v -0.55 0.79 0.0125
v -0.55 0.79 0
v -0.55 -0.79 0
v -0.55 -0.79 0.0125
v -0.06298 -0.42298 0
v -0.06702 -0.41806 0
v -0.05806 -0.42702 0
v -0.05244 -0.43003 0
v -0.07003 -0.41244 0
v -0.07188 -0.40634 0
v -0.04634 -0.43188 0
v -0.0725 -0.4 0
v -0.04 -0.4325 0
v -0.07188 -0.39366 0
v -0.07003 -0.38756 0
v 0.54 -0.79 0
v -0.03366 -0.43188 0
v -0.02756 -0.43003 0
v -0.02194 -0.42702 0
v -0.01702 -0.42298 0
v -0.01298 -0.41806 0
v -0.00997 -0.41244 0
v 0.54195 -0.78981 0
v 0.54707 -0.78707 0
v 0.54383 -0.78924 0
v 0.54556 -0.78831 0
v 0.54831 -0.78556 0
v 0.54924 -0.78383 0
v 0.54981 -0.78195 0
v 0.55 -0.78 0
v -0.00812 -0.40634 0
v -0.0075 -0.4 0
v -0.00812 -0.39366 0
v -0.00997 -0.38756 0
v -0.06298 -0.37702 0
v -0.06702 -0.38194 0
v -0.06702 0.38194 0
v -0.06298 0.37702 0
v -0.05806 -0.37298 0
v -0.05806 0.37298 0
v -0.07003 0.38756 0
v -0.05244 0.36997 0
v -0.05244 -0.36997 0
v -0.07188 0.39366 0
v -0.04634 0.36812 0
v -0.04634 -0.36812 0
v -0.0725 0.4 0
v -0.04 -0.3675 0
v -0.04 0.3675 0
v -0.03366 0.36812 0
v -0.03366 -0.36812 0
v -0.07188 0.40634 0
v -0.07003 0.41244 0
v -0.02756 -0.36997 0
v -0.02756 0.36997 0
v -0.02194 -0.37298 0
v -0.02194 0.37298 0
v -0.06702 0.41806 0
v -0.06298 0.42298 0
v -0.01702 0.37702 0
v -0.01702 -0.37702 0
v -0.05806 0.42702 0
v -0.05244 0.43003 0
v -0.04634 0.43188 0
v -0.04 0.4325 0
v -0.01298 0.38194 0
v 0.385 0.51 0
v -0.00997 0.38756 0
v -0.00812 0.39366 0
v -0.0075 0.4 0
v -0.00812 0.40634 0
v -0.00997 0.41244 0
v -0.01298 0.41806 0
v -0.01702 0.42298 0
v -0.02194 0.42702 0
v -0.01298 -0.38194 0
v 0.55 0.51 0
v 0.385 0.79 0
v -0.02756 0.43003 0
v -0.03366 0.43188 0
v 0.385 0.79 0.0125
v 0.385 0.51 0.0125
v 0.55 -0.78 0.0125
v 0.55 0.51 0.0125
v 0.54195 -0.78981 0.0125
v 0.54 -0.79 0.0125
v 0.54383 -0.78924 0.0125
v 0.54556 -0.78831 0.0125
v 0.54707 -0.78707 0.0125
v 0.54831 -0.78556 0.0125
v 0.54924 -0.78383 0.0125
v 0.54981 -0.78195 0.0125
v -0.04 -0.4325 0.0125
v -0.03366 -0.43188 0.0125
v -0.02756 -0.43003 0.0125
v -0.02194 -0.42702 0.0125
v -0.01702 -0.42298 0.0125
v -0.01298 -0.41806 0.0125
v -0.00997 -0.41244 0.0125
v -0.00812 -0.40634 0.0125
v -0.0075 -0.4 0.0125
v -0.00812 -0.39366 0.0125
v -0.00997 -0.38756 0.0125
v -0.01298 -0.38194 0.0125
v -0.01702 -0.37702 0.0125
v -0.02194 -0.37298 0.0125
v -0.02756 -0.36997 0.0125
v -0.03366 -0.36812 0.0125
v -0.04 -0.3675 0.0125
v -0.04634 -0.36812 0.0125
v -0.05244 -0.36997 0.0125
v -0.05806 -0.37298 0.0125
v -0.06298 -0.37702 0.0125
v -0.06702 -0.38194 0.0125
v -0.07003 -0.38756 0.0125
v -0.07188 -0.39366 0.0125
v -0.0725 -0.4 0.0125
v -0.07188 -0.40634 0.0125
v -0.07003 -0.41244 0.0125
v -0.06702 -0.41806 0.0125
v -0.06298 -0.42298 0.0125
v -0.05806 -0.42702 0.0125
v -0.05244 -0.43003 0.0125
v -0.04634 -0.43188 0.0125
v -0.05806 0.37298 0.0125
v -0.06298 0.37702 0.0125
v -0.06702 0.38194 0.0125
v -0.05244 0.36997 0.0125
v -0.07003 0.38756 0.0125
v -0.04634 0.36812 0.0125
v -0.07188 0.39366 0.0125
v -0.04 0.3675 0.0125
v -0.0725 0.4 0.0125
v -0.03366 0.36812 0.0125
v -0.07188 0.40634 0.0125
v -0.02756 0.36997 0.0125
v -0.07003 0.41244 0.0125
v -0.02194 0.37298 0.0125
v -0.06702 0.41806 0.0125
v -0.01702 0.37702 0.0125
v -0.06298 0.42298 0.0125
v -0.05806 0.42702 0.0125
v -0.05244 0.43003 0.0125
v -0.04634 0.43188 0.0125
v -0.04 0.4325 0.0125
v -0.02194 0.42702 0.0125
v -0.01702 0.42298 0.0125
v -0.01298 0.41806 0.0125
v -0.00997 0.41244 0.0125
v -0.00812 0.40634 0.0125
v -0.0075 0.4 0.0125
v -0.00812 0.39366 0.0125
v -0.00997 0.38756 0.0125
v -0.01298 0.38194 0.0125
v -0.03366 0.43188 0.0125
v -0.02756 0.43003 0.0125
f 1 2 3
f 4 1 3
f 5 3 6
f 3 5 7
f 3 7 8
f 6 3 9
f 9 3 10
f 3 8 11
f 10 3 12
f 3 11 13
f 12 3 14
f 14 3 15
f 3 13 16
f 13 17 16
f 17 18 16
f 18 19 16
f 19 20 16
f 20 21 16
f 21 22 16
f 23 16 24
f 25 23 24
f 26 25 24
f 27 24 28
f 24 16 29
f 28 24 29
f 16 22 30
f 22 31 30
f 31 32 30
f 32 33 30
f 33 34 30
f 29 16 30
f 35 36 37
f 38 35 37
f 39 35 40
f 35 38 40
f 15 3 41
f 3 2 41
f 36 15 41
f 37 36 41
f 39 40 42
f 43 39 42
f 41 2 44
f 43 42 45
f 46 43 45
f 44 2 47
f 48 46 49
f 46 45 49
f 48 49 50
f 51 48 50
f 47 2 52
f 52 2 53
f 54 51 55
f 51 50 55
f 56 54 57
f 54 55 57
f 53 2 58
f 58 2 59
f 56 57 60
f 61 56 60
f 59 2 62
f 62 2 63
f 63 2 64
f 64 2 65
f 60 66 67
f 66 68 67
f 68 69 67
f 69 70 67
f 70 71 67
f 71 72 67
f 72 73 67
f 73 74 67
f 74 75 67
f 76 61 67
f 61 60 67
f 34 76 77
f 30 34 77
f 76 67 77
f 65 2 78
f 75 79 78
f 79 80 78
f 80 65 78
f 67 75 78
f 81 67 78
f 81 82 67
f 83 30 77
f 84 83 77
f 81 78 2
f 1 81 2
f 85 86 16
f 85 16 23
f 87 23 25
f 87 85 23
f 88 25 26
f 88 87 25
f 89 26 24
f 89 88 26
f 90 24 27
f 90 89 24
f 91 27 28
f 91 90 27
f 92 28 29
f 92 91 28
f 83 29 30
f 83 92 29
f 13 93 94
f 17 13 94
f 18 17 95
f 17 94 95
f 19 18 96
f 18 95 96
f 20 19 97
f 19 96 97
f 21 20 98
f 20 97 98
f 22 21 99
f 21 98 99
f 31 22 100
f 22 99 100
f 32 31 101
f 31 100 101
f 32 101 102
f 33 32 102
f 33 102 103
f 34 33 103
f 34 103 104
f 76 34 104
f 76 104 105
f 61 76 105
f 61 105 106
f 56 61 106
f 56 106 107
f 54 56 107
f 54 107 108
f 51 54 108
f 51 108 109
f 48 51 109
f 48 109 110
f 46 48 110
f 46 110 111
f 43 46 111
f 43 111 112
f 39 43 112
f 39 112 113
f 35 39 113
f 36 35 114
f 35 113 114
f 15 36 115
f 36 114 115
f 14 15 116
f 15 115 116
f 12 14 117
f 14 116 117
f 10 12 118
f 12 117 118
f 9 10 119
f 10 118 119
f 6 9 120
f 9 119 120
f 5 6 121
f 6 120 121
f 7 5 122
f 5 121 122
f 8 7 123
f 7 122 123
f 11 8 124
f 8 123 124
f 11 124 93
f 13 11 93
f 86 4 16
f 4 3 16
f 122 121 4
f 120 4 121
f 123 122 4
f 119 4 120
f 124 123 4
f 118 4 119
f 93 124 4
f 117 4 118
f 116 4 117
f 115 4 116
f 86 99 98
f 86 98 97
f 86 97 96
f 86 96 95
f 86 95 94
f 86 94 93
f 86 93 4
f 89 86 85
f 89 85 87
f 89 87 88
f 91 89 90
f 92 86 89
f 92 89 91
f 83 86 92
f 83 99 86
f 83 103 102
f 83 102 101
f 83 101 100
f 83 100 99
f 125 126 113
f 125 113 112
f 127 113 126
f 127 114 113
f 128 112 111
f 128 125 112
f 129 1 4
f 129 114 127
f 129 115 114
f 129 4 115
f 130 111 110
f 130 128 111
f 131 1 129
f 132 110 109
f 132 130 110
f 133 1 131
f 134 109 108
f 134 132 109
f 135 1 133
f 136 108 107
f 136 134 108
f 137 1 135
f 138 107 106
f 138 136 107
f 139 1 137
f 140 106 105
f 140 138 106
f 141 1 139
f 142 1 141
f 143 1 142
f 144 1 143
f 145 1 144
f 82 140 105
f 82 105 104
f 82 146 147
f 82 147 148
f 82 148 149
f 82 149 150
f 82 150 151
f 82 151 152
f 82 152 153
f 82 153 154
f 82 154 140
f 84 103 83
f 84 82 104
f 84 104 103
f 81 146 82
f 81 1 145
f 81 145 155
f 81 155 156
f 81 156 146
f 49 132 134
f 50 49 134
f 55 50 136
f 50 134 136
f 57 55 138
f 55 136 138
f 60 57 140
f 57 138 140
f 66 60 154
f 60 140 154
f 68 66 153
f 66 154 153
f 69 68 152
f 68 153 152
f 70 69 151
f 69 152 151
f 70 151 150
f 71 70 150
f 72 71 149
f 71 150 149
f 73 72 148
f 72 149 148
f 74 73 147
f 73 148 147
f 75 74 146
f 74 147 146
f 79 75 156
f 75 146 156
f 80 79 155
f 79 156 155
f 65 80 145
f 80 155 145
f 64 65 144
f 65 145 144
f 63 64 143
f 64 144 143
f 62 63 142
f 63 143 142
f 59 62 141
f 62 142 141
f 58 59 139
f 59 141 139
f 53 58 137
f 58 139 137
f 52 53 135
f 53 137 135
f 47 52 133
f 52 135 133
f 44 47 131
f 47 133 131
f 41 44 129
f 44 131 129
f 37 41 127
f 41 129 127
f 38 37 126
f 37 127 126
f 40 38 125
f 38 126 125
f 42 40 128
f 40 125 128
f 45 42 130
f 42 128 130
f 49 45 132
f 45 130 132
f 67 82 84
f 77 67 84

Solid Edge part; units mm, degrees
sketch "Sketch1" plane through (0, 0, 0) normal (0, 0, 1) x (1, 0, 0)
  line L0 (-0.55, -0.79) -> (0.55, -0.79)
  line L1 (0.55, -0.79) -> (0.55, 0.79)
  line L2 (0.55, 0.79) -> (-0.55, 0.79)
  line L3 (-0.55, 0.79) -> (-0.55, -0.79)
  dimension "D1" = 1.1
  dimension "D2" = 1.58
extrude "Protrusion1" add sketch "Sketch1" along normal blind 0.0125
fillet "Verrundung_1" radius 0.01 1 edges at (0.55, -0.79, 0.0063)
sketch "Sketch2" plane through (0, 0, 0.0125) normal (0, 0, 1) x (0, -1, 0)
  line L0 (-0.51, 0.715) -> (-0.79, 0.715)
  line L1 (-0.79, 0.385) -> (-0.79, 0.715)
  line L2 (-0.51, 0.385) -> (-0.79, 0.385)
  line L3 (-0.51, 0.385) -> (-0.51, 0.715)
extrude "Cutout1" cut sketch "Sketch2" against normal through all
hole "Bohrung_1" at (-0.04, 0.4, 0.0125) direction (0, 0, -1) diameter 0.065 end up to next
hole "Hole1" at (-0.04, -0.4, 0.0125) direction (0, 0, -1) diameter 0.065 end up to next
